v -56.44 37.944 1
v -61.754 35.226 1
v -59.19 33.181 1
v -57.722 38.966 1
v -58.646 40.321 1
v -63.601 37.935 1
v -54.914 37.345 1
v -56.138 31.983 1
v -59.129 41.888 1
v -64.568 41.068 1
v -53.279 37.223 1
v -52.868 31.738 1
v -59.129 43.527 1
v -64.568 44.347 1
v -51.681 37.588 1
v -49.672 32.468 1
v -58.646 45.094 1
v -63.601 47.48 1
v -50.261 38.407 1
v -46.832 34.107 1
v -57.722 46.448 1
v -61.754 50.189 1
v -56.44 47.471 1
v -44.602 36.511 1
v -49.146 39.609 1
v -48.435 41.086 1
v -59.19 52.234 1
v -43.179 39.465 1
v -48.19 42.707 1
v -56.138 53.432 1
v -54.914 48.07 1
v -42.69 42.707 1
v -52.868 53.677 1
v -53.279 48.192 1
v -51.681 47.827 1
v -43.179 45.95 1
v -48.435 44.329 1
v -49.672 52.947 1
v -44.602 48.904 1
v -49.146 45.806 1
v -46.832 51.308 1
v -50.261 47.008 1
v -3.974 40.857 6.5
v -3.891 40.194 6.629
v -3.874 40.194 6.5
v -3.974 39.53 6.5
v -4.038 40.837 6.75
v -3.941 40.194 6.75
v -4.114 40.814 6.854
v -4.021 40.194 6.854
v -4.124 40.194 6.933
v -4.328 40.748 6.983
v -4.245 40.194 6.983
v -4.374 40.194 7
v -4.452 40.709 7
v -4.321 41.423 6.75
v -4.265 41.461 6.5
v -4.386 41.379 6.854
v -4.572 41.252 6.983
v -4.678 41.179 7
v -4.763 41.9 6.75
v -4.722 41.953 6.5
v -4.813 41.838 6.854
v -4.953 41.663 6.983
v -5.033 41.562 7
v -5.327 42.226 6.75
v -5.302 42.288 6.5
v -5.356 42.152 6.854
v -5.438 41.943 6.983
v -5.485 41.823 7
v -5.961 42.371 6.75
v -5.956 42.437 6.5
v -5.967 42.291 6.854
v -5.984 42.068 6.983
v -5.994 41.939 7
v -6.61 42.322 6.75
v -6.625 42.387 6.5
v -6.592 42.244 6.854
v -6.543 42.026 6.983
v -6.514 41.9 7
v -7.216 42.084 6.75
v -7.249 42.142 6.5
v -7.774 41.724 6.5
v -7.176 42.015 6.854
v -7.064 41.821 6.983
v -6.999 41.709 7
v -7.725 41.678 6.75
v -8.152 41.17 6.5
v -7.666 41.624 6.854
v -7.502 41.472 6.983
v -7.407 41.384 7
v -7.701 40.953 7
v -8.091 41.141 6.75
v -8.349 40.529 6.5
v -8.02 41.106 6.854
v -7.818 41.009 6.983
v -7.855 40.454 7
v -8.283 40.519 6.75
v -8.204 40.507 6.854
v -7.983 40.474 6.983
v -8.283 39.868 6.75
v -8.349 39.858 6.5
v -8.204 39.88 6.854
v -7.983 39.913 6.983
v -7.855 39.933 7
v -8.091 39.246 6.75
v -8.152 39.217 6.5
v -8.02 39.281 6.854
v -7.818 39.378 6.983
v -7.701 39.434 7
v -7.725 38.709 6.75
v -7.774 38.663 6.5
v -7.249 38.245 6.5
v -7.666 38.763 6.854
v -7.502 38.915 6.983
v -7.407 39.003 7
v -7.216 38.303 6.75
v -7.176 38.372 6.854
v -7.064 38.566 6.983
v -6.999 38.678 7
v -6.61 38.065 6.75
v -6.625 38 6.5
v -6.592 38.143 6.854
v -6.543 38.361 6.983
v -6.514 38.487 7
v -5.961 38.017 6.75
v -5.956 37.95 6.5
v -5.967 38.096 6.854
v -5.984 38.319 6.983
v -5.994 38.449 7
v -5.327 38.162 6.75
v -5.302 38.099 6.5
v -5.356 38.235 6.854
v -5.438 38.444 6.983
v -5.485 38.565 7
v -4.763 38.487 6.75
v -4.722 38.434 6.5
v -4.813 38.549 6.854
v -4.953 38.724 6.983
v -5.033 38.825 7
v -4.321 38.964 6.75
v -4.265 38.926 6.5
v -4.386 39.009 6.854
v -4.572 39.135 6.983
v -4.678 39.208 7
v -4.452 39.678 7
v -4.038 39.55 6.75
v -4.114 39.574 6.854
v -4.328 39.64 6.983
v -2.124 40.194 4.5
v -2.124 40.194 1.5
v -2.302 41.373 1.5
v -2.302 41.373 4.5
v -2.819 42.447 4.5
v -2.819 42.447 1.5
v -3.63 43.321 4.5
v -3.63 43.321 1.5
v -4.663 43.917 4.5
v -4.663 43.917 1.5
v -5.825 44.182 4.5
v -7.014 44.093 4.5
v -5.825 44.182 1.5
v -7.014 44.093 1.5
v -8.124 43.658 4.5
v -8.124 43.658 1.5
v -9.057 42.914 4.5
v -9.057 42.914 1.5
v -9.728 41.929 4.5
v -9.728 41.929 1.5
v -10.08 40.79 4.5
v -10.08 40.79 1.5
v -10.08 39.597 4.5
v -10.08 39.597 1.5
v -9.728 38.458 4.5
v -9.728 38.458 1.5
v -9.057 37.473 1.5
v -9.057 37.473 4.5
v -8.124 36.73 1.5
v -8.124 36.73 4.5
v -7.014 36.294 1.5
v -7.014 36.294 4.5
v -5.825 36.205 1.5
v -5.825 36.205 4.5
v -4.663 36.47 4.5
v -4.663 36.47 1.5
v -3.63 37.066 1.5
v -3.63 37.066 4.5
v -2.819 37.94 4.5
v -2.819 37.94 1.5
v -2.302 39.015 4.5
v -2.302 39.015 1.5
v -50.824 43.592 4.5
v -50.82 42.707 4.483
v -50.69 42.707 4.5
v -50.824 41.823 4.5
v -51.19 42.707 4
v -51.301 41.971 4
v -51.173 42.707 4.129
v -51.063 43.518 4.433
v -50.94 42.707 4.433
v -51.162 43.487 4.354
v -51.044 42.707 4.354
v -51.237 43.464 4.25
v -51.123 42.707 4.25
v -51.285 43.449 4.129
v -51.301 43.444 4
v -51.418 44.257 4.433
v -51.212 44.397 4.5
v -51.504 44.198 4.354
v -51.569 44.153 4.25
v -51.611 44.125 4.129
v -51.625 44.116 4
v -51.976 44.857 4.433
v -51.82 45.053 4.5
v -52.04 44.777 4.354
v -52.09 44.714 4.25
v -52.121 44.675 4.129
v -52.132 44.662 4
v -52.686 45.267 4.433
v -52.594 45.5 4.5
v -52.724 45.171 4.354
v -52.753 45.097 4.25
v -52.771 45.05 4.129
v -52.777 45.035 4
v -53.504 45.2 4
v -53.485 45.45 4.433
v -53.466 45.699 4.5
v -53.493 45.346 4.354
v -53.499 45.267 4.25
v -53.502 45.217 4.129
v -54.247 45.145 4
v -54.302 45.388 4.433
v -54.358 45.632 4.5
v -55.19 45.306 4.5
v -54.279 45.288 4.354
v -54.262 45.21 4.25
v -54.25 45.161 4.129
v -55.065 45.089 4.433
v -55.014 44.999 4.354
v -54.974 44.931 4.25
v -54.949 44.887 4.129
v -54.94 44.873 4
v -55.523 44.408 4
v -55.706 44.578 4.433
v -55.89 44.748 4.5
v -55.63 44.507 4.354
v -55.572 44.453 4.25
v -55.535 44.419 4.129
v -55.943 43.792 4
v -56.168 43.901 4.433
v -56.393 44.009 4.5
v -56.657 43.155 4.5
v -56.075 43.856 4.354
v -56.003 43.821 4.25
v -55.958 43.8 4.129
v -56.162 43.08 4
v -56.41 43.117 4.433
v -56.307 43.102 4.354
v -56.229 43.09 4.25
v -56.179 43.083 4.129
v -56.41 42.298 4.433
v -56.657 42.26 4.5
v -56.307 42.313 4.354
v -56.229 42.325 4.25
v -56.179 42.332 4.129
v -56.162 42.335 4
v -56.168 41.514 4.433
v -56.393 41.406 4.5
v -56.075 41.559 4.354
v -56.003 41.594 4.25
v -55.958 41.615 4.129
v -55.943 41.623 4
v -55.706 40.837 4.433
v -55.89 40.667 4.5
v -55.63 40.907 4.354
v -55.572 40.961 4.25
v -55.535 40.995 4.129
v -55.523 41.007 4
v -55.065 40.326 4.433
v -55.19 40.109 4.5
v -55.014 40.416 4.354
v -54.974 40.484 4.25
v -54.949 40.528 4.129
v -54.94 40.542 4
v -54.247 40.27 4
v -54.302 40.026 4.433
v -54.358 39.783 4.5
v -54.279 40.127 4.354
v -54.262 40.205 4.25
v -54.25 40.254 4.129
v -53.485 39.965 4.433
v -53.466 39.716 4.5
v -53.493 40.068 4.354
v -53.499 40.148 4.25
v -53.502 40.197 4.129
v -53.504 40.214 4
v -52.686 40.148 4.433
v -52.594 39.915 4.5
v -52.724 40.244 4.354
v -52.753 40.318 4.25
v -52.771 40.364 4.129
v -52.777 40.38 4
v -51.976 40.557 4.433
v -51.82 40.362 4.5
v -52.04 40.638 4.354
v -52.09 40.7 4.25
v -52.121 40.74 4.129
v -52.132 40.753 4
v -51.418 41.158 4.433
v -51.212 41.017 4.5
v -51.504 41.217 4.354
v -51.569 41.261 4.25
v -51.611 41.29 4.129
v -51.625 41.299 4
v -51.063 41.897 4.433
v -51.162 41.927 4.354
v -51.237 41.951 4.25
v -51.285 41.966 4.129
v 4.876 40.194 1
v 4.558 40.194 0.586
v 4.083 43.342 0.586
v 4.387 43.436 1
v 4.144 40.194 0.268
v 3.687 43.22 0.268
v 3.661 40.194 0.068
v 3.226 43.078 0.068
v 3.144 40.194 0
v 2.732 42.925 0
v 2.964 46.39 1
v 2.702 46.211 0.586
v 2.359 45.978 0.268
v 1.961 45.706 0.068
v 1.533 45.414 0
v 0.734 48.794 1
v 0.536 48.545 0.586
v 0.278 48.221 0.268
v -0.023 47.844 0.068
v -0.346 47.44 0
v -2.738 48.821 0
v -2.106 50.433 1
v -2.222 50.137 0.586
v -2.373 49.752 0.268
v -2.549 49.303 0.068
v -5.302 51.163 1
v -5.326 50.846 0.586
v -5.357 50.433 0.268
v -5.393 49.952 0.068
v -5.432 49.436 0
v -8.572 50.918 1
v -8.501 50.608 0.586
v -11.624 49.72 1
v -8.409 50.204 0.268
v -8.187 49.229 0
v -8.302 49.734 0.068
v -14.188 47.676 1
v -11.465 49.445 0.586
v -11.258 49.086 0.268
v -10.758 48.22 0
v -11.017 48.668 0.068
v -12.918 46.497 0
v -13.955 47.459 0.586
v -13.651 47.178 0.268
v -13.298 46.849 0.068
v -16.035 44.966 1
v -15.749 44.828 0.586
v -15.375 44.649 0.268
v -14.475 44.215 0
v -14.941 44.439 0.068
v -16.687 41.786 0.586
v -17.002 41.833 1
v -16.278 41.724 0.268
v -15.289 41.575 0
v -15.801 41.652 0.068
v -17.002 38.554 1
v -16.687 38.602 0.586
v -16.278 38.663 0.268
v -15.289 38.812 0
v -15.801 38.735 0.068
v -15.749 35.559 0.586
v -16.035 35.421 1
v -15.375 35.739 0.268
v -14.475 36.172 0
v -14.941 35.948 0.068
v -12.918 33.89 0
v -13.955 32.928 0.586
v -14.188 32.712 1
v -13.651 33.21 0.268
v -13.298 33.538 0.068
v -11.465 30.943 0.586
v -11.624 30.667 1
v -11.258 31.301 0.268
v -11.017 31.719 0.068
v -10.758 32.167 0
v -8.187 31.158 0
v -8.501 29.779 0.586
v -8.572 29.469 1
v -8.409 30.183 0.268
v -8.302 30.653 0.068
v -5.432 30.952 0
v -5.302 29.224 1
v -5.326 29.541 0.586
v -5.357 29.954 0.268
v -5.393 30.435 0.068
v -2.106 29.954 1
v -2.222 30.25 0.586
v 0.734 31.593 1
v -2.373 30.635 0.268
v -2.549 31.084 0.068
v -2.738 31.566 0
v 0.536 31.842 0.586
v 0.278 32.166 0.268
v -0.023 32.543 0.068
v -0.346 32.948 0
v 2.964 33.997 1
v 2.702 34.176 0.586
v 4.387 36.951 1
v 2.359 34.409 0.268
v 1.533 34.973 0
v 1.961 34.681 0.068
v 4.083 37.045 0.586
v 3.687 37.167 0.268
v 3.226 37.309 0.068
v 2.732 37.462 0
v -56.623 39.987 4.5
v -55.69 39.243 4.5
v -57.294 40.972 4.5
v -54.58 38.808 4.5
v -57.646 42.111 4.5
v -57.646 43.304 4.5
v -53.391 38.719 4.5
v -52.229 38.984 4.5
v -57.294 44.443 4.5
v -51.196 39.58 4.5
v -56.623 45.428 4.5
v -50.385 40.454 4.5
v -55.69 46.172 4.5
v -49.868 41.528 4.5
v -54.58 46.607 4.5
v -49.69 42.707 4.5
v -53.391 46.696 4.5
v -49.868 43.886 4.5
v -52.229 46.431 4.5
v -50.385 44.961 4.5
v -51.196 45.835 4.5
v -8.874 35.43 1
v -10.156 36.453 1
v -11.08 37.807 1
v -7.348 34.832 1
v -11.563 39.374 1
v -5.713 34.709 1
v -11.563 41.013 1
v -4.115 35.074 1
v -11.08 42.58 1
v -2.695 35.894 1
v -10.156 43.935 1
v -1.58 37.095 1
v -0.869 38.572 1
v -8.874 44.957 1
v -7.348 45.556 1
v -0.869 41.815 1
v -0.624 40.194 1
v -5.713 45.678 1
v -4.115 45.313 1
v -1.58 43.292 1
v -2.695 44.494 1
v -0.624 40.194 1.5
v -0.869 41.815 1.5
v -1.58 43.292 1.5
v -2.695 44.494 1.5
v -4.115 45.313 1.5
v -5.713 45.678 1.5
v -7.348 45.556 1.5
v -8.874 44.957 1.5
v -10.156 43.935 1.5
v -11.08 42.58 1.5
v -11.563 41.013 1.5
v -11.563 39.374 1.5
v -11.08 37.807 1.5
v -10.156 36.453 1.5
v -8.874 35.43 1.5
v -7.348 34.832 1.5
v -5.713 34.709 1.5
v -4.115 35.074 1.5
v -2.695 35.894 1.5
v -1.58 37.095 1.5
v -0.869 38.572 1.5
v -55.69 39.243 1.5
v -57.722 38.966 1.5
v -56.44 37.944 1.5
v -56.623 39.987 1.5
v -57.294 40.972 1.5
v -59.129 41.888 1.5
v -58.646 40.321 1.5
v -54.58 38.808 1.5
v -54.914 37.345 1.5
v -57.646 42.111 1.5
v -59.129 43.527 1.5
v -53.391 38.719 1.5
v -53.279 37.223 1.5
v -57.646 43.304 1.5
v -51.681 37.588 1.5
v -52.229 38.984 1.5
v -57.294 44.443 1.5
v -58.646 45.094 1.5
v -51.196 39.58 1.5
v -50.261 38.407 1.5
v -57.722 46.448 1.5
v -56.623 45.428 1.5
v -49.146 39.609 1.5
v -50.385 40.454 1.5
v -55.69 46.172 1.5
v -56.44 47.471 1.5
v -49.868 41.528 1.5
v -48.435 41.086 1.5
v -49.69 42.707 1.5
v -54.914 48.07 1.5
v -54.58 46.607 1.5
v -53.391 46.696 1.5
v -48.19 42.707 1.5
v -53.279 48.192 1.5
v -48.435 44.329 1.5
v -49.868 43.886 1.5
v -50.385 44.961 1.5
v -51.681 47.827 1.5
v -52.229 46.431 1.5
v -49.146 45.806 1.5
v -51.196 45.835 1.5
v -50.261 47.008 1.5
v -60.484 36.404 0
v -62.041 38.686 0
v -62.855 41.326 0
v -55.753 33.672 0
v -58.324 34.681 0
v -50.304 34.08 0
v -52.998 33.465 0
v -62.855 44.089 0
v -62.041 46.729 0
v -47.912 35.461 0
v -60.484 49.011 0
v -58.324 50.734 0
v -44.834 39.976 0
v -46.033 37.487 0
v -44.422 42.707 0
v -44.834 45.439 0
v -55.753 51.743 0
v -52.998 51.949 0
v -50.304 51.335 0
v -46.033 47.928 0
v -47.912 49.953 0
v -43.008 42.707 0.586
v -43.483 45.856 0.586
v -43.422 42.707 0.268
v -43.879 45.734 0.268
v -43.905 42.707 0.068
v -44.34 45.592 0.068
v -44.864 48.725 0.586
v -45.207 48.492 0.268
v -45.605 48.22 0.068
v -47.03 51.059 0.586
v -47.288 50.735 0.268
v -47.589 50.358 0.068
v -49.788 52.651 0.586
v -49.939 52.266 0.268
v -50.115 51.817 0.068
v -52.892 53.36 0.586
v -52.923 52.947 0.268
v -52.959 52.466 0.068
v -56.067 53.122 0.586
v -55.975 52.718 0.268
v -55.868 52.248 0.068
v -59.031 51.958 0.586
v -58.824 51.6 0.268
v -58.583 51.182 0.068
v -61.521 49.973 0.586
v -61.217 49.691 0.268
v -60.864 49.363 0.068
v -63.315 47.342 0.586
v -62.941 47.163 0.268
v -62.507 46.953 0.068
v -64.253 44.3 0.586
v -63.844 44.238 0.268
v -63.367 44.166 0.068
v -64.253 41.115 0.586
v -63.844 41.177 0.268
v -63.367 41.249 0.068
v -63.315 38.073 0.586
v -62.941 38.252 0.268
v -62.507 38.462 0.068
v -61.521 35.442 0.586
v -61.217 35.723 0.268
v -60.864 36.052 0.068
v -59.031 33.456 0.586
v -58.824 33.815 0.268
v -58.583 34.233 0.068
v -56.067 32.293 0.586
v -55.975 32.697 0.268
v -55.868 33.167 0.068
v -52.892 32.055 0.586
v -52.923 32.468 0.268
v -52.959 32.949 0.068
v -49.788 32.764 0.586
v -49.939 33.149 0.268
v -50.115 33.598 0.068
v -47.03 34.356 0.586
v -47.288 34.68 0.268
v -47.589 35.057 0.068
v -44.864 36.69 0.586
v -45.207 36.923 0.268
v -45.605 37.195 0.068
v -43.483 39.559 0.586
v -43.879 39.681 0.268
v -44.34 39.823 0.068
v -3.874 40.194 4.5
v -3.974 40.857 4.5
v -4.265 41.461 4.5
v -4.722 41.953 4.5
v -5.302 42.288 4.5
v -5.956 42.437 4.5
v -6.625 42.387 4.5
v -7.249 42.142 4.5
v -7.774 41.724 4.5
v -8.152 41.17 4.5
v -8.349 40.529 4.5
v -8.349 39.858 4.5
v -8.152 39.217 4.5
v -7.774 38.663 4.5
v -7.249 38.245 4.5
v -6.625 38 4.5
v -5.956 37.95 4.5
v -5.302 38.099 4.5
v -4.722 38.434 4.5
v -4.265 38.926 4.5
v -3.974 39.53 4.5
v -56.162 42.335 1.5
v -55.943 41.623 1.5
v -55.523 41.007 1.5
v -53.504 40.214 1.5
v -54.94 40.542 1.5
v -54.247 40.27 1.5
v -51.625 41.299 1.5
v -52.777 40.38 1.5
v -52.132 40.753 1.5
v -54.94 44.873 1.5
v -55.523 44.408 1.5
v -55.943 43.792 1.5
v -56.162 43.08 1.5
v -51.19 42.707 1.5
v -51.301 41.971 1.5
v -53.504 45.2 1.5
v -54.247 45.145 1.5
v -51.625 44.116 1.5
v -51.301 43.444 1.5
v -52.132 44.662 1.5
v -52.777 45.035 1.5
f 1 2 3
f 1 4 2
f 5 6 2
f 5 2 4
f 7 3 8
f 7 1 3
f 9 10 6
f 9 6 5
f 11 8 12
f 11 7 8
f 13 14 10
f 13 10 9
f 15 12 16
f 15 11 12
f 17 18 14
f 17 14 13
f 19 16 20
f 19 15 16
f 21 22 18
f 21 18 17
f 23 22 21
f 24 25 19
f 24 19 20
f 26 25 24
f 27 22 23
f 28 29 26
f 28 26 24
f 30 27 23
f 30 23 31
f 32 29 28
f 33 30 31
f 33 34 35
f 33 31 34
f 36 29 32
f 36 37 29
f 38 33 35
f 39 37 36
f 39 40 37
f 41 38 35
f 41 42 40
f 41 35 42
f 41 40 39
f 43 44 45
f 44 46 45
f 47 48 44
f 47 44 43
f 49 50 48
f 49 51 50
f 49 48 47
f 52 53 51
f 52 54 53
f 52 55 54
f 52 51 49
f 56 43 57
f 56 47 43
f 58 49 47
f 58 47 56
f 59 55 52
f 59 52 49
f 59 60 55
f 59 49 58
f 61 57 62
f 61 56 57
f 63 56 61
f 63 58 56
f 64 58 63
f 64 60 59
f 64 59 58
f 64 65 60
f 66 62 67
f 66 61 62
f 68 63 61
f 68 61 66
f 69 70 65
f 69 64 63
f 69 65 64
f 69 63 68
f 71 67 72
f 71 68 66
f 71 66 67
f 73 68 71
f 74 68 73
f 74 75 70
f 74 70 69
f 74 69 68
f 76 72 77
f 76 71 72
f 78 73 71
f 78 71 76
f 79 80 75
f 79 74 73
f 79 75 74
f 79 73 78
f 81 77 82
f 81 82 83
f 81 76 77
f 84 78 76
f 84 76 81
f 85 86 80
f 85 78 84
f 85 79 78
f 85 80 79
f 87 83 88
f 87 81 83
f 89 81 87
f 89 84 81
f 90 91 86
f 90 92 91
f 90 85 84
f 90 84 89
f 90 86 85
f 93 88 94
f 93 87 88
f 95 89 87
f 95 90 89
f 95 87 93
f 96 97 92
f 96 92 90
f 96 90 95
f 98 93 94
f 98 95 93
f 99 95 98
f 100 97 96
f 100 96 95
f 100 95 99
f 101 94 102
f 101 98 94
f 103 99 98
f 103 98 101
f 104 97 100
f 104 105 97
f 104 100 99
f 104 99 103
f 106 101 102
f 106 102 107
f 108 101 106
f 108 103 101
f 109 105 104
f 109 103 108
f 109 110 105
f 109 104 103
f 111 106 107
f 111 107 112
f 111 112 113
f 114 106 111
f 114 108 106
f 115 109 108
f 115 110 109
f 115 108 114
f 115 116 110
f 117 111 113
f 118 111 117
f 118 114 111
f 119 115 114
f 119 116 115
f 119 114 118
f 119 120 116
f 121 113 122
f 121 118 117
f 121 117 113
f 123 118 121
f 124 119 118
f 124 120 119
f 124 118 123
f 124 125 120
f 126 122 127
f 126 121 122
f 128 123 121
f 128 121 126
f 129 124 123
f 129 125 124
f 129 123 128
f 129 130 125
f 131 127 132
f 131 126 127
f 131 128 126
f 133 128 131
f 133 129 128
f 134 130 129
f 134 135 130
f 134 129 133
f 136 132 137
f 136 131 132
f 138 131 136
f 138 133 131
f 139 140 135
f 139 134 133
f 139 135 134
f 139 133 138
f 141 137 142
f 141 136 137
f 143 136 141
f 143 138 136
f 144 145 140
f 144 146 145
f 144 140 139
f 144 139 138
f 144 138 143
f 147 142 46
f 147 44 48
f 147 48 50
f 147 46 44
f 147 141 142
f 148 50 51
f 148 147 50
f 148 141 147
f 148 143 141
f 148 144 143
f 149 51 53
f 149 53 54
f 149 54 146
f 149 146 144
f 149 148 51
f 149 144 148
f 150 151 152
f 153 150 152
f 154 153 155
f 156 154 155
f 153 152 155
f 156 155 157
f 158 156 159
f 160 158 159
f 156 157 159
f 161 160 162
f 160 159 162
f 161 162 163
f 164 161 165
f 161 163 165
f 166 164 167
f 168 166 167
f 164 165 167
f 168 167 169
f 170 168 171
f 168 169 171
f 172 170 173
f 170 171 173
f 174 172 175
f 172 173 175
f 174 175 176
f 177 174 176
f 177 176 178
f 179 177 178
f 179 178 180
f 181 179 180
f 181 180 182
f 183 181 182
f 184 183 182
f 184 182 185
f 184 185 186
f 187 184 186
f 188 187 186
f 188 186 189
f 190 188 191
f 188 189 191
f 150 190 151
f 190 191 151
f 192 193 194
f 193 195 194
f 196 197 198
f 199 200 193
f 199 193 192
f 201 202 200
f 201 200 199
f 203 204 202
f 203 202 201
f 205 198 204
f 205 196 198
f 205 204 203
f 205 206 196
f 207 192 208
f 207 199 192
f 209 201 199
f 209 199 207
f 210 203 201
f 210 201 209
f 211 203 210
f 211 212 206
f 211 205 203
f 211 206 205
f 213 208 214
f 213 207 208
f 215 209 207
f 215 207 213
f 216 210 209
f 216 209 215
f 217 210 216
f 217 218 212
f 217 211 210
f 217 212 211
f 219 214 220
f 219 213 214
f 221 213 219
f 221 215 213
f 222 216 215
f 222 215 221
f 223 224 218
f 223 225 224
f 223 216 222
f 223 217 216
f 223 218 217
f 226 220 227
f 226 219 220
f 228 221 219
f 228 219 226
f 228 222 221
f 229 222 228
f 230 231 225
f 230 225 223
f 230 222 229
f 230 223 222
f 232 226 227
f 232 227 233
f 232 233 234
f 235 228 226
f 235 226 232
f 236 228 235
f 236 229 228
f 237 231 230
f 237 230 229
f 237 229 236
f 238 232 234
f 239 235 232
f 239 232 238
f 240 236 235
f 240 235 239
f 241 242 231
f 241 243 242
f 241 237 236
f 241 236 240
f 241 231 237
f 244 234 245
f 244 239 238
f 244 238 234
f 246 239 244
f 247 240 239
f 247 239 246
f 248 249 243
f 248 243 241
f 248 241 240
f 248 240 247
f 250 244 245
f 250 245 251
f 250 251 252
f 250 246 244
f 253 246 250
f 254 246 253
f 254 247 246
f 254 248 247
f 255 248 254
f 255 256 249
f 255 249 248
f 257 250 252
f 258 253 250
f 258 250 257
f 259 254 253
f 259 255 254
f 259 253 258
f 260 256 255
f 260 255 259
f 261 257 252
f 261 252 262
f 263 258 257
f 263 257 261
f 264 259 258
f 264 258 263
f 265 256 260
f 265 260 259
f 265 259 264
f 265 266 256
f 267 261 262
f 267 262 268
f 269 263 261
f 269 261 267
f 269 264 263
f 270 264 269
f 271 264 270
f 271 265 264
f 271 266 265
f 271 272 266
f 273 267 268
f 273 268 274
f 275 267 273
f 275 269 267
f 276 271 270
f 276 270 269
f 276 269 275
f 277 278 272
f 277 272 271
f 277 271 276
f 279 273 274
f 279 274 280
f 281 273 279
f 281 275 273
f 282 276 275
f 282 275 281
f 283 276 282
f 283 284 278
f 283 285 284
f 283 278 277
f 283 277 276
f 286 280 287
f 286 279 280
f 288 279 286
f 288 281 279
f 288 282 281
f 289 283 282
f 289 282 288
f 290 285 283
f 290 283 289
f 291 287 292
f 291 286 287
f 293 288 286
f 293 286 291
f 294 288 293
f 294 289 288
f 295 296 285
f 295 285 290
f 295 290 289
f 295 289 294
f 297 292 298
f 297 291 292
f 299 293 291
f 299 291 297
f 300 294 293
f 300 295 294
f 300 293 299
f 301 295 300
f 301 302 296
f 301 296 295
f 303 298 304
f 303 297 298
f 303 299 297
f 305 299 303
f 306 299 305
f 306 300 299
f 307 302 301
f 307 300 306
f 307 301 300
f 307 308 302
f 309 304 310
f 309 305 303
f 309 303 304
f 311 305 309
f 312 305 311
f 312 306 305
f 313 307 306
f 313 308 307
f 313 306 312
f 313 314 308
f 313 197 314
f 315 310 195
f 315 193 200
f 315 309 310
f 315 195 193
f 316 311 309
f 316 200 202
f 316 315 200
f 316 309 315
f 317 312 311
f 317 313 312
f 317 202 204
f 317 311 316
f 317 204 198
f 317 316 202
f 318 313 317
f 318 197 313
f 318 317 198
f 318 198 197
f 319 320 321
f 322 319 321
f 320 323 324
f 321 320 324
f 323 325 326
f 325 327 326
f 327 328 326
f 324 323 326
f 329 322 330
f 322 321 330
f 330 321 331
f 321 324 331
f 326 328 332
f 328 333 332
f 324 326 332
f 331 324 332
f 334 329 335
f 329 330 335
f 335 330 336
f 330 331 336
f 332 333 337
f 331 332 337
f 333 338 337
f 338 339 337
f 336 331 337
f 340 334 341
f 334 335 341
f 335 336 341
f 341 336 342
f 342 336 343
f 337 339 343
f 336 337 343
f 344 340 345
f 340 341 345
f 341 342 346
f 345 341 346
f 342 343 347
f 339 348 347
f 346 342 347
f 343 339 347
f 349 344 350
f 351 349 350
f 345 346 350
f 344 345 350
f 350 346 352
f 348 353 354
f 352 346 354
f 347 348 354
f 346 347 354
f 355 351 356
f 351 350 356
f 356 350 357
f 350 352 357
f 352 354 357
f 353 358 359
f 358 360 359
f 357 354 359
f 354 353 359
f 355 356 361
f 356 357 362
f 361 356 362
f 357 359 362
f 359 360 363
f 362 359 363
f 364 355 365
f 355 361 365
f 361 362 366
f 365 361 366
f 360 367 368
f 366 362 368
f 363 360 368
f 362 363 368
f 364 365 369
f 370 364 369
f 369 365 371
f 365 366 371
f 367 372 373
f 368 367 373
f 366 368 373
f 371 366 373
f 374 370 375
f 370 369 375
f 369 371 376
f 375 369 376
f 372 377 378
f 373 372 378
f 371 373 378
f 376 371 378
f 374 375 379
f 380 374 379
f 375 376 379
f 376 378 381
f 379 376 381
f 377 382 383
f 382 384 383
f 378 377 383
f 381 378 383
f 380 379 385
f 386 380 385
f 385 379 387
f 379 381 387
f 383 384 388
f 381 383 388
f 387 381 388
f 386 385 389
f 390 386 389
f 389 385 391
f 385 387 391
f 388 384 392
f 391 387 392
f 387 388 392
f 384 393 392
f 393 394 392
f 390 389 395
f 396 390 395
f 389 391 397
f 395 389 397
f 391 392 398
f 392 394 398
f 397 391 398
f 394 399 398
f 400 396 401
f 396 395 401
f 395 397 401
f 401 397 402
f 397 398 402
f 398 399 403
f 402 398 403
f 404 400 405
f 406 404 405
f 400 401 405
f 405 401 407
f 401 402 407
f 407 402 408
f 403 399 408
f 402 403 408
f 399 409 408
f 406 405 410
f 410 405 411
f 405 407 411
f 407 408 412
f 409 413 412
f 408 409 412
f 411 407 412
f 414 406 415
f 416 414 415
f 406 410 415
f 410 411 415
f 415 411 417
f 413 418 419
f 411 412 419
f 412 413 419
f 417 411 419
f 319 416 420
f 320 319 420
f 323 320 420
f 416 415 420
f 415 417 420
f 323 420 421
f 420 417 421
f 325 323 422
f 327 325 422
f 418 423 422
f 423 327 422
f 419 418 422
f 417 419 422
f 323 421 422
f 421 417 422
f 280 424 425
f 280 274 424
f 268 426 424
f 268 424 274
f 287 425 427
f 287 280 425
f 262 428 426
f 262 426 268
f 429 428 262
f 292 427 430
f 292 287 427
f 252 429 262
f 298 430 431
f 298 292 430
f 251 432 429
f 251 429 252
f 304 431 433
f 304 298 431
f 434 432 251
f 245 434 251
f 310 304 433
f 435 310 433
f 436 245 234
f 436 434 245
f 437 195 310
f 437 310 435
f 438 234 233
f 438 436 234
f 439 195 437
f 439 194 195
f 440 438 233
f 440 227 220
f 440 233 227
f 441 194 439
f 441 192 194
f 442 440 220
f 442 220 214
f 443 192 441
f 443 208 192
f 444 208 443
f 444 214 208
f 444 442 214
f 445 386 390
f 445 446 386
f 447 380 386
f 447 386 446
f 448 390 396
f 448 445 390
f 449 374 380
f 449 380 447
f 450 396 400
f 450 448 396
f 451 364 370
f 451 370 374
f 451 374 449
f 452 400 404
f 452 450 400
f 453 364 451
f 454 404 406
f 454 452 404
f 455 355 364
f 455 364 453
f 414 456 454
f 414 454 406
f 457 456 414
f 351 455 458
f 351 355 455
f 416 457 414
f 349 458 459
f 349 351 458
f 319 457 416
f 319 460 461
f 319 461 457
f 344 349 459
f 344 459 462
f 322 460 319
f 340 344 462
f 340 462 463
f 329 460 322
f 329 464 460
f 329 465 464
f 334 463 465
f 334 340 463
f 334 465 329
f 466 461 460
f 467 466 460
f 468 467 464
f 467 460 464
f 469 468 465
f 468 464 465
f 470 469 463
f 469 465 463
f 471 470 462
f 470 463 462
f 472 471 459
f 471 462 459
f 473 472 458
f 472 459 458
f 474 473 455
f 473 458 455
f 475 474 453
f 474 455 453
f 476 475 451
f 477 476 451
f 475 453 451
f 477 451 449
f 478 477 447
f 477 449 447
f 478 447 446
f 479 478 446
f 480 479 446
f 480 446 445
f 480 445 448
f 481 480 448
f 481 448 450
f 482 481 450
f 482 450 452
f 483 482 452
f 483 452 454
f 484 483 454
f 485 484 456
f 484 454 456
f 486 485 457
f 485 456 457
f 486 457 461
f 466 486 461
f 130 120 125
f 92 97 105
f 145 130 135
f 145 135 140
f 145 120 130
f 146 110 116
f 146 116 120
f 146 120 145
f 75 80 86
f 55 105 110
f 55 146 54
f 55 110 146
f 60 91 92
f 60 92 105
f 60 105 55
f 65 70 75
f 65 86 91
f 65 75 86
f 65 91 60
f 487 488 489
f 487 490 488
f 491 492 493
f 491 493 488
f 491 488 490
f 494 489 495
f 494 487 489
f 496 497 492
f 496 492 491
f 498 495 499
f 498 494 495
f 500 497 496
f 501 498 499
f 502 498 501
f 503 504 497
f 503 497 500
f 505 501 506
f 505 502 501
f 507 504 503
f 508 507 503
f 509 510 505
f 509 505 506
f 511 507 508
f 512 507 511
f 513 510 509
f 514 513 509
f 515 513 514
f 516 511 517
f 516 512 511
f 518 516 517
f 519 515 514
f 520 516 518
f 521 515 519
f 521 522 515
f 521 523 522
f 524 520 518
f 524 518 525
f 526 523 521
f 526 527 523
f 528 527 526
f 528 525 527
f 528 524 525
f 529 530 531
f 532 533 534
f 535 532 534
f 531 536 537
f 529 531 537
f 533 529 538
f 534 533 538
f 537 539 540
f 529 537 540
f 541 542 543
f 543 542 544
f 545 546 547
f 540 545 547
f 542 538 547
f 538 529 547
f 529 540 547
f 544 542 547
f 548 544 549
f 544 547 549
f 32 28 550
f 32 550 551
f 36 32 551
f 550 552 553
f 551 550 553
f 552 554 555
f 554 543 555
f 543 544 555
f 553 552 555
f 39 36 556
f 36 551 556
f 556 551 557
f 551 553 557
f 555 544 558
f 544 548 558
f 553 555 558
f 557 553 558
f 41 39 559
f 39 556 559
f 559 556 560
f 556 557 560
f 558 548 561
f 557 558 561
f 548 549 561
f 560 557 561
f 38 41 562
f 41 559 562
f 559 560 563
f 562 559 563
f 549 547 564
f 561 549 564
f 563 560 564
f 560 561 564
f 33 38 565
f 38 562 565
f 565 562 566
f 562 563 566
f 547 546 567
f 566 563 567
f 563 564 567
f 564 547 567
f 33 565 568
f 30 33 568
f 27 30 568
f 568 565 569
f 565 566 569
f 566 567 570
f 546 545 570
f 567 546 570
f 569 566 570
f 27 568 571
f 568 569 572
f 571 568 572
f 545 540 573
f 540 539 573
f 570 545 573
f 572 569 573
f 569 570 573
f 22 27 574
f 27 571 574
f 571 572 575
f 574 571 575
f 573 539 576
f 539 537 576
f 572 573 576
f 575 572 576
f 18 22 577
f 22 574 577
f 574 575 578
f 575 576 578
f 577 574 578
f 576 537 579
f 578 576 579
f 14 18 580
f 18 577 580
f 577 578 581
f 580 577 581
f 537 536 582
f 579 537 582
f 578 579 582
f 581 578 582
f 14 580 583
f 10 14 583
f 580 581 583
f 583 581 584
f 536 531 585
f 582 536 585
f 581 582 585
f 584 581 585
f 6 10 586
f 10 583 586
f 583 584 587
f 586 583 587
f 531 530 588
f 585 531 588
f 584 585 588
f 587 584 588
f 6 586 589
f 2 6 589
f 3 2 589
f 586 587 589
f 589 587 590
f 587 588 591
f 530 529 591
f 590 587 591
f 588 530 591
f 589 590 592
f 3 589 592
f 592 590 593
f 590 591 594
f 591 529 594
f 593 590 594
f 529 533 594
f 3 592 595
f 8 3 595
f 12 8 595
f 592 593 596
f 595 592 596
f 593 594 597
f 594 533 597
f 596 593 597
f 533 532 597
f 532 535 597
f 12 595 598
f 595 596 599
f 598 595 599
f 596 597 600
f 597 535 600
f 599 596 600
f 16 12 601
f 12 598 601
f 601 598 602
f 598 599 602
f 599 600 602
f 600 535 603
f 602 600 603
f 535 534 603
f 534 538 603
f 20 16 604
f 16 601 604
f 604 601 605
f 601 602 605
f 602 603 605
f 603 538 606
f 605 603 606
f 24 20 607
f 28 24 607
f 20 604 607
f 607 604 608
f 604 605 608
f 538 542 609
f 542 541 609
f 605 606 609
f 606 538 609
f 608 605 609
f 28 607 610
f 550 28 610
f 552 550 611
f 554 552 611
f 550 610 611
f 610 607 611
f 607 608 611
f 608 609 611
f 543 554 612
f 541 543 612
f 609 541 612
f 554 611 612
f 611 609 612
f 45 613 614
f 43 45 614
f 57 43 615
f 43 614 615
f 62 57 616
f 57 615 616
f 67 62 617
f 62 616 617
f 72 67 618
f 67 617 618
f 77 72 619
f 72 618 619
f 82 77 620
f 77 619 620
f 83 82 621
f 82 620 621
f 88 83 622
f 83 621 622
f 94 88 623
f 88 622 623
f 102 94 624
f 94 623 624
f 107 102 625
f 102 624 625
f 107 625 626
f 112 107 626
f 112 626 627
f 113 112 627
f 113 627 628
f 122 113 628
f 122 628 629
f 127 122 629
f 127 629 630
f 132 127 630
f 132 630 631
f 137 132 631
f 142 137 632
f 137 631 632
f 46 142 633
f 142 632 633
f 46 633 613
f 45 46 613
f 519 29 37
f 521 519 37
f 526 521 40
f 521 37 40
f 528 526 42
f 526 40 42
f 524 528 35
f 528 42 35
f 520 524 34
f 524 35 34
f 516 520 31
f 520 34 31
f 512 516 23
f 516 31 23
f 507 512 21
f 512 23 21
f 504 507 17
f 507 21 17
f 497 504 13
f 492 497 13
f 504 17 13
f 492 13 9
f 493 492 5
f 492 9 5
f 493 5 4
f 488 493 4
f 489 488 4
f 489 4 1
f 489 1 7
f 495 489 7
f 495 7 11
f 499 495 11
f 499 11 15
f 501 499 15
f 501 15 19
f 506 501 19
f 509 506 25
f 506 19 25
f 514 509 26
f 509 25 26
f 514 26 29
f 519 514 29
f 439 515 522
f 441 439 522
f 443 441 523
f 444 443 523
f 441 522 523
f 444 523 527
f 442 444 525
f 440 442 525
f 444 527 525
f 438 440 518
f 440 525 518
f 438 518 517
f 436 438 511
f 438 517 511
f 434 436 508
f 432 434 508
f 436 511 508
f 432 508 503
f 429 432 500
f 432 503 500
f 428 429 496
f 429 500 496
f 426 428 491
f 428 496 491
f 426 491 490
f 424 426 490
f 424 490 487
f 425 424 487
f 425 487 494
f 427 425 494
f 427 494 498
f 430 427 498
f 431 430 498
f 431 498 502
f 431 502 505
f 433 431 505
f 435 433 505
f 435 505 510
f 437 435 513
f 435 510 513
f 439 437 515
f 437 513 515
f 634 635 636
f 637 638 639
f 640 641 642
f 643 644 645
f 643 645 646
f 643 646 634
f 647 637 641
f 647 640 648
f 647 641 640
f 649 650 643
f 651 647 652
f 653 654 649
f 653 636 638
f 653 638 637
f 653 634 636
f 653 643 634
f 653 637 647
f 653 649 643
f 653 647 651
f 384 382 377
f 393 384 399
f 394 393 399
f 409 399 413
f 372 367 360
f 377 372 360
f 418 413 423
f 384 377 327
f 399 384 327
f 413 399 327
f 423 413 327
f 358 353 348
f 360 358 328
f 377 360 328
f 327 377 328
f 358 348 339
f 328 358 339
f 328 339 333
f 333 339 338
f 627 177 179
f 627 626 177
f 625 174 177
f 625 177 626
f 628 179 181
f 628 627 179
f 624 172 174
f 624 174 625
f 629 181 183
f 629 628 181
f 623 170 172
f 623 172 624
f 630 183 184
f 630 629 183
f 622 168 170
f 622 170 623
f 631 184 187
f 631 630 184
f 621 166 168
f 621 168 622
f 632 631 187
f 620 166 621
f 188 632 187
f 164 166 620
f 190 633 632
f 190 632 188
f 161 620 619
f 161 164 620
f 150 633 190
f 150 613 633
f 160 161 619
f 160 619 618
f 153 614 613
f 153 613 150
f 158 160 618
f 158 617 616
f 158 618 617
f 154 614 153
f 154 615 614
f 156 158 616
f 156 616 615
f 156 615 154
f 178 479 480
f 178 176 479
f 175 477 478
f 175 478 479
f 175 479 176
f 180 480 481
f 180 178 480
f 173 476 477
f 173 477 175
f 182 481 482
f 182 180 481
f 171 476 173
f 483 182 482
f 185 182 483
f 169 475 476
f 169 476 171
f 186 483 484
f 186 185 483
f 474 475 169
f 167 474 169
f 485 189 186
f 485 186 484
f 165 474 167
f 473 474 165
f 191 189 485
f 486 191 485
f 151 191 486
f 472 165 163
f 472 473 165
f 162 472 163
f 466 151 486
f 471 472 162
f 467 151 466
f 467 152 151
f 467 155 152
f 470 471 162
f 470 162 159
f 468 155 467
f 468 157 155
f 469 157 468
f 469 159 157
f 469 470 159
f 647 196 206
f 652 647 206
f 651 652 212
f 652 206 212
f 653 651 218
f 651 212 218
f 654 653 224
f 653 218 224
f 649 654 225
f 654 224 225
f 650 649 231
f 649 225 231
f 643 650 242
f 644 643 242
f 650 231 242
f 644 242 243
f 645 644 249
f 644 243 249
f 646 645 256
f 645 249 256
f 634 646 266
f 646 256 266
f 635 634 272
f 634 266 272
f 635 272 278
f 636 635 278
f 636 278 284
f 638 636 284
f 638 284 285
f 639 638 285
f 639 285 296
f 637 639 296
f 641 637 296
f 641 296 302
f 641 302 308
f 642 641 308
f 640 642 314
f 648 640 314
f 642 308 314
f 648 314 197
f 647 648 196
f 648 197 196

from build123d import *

# Parameters (mm, degrees)
F0_R      = 11
F1_DEPTH  = 1
F2_R      = 5.5
F3_DEPTH  = 0.5
F4_R      = 4
F5_DEPTH  = 3
F7_R      = 2.5
F8_DEPTH  = 3
F9_R      = 5.5
F10_DEPTH = 0.5
F11_R     = 4
F12_DEPTH = 3
F13_R     = 2.25
F14_DEPTH = 2.5
F15_R     = 0.5
F15_2_R   = 0.5


# Not quite as in the source:
# - a fillet or chamfer that OpenCascade refuses, or shapes differently, is made with other operations: its cross-section is extruded or revolved along the edge and cut away or added


with BuildPart() as f1:
    # F0 (on Top) → F1 (new body)
    with BuildSketch(Plane.XY):
        with Locations((-53.6903738976, 42.7074432373)):
            Circle(F0_R)
    extrude(amount=F1_DEPTH)

    # F2 (on face) → F3 (join)
    with BuildSketch(Plane.XY.offset(1)):
        with Locations((-53.6903738976, 42.7074432373)):
            Circle(F2_R)
    extrude(amount=F3_DEPTH)

    # F4 (on face) → F5 (join)
    with BuildSketch(Plane.XY.offset(1.5)):
        with Locations((-53.6903738976, 42.7074432373)):
            Circle(F4_R)
    extrude(amount=F5_DEPTH)

    # F6: fillet of radius 2 on 1 edges, made by hand

    # F6_s1 → F6_t2 (revolve, cut)
    with BuildSketch(Plane.XZ.offset(-42.7074432373)):
        with BuildLine():
            ThreePointArc((-42.6903738976, 1), (-43.4224247051, 0.2679491924), (-44.4224247051, 0))
            Line((-44.4224247051, 0), (-42.6903738976, 0))
            Line((-42.6903738976, 0), (-42.6903738976, 1))
        make_face()
    revolve(axis=Axis((-53.6903738976, 42.7074432373, 0), (0, 0, 1)), mode=Mode.SUBTRACT)

    # F7 (on face) → F8 (cut)
    with BuildSketch(Plane.XY.offset(4.5)):
        with Locations((-53.6903738976, 42.7074432373)):
            Circle(F7_R)
    extrude(amount=-F8_DEPTH, mode=Mode.SUBTRACT)

    # F15
    f15_edges = [f1.edges().sort_by_distance(p)[0] for p in [
        (-56.190374, 42.707443, 4.5),
    ]]
    fillet(f15_edges, radius=F15_R)


with BuildPart() as f1b:
    # F0 (on Top) → F1, piece 2 (new body)
    with BuildSketch(Plane.XY):
        with Locations((-6.1243791133, 40.1936098933)):
            Circle(F0_R)
    extrude(amount=F1_DEPTH)

    # F9 (on face) → F10 (join)
    with BuildSketch(Plane.XY.offset(1)):
        with Locations((-6.1243791133, 40.1936098933)):
            Circle(F9_R)
    extrude(amount=F10_DEPTH)

    # F11 (on face) → F12 (join)
    with BuildSketch(Plane.XY.offset(1.5)):
        with Locations((-6.1243791133, 40.1936098933)):
            Circle(F11_R)
    extrude(amount=F12_DEPTH)

    # F13 (on face) → F14 (join)
    with BuildSketch(Plane.XY.offset(4.5)):
        with Locations((-6.1243791133, 40.1936098933)):
            Circle(F13_R)
    extrude(amount=F14_DEPTH)

    # F15#2
    f15_2_edges = [f1b.edges().sort_by_distance(p)[0] for p in [
        (-8.374379, 40.19361, 7),
    ]]
    fillet(f15_2_edges, radius=F15_2_R)

    # F16: fillet of radius 2 on 1 edges, made by hand

    # F16_s1 → F16_t2 (revolve, cut)
    with BuildSketch(Plane.XZ.offset(-40.1936098933)):
        with BuildLine():
            ThreePointArc((4.8756208867, 1), (4.1435700791, 0.2679491924), (3.1435700791, 0))
            Line((3.1435700791, 0), (4.8756208867, 0))
            Line((4.8756208867, 0), (4.8756208867, 1))
        make_face()
    revolve(axis=Axis((-6.1243791133, 40.1936098933, 0), (0, 0, 1)), mode=Mode.SUBTRACT)


solid = Compound([f1.part, f1b.part])
